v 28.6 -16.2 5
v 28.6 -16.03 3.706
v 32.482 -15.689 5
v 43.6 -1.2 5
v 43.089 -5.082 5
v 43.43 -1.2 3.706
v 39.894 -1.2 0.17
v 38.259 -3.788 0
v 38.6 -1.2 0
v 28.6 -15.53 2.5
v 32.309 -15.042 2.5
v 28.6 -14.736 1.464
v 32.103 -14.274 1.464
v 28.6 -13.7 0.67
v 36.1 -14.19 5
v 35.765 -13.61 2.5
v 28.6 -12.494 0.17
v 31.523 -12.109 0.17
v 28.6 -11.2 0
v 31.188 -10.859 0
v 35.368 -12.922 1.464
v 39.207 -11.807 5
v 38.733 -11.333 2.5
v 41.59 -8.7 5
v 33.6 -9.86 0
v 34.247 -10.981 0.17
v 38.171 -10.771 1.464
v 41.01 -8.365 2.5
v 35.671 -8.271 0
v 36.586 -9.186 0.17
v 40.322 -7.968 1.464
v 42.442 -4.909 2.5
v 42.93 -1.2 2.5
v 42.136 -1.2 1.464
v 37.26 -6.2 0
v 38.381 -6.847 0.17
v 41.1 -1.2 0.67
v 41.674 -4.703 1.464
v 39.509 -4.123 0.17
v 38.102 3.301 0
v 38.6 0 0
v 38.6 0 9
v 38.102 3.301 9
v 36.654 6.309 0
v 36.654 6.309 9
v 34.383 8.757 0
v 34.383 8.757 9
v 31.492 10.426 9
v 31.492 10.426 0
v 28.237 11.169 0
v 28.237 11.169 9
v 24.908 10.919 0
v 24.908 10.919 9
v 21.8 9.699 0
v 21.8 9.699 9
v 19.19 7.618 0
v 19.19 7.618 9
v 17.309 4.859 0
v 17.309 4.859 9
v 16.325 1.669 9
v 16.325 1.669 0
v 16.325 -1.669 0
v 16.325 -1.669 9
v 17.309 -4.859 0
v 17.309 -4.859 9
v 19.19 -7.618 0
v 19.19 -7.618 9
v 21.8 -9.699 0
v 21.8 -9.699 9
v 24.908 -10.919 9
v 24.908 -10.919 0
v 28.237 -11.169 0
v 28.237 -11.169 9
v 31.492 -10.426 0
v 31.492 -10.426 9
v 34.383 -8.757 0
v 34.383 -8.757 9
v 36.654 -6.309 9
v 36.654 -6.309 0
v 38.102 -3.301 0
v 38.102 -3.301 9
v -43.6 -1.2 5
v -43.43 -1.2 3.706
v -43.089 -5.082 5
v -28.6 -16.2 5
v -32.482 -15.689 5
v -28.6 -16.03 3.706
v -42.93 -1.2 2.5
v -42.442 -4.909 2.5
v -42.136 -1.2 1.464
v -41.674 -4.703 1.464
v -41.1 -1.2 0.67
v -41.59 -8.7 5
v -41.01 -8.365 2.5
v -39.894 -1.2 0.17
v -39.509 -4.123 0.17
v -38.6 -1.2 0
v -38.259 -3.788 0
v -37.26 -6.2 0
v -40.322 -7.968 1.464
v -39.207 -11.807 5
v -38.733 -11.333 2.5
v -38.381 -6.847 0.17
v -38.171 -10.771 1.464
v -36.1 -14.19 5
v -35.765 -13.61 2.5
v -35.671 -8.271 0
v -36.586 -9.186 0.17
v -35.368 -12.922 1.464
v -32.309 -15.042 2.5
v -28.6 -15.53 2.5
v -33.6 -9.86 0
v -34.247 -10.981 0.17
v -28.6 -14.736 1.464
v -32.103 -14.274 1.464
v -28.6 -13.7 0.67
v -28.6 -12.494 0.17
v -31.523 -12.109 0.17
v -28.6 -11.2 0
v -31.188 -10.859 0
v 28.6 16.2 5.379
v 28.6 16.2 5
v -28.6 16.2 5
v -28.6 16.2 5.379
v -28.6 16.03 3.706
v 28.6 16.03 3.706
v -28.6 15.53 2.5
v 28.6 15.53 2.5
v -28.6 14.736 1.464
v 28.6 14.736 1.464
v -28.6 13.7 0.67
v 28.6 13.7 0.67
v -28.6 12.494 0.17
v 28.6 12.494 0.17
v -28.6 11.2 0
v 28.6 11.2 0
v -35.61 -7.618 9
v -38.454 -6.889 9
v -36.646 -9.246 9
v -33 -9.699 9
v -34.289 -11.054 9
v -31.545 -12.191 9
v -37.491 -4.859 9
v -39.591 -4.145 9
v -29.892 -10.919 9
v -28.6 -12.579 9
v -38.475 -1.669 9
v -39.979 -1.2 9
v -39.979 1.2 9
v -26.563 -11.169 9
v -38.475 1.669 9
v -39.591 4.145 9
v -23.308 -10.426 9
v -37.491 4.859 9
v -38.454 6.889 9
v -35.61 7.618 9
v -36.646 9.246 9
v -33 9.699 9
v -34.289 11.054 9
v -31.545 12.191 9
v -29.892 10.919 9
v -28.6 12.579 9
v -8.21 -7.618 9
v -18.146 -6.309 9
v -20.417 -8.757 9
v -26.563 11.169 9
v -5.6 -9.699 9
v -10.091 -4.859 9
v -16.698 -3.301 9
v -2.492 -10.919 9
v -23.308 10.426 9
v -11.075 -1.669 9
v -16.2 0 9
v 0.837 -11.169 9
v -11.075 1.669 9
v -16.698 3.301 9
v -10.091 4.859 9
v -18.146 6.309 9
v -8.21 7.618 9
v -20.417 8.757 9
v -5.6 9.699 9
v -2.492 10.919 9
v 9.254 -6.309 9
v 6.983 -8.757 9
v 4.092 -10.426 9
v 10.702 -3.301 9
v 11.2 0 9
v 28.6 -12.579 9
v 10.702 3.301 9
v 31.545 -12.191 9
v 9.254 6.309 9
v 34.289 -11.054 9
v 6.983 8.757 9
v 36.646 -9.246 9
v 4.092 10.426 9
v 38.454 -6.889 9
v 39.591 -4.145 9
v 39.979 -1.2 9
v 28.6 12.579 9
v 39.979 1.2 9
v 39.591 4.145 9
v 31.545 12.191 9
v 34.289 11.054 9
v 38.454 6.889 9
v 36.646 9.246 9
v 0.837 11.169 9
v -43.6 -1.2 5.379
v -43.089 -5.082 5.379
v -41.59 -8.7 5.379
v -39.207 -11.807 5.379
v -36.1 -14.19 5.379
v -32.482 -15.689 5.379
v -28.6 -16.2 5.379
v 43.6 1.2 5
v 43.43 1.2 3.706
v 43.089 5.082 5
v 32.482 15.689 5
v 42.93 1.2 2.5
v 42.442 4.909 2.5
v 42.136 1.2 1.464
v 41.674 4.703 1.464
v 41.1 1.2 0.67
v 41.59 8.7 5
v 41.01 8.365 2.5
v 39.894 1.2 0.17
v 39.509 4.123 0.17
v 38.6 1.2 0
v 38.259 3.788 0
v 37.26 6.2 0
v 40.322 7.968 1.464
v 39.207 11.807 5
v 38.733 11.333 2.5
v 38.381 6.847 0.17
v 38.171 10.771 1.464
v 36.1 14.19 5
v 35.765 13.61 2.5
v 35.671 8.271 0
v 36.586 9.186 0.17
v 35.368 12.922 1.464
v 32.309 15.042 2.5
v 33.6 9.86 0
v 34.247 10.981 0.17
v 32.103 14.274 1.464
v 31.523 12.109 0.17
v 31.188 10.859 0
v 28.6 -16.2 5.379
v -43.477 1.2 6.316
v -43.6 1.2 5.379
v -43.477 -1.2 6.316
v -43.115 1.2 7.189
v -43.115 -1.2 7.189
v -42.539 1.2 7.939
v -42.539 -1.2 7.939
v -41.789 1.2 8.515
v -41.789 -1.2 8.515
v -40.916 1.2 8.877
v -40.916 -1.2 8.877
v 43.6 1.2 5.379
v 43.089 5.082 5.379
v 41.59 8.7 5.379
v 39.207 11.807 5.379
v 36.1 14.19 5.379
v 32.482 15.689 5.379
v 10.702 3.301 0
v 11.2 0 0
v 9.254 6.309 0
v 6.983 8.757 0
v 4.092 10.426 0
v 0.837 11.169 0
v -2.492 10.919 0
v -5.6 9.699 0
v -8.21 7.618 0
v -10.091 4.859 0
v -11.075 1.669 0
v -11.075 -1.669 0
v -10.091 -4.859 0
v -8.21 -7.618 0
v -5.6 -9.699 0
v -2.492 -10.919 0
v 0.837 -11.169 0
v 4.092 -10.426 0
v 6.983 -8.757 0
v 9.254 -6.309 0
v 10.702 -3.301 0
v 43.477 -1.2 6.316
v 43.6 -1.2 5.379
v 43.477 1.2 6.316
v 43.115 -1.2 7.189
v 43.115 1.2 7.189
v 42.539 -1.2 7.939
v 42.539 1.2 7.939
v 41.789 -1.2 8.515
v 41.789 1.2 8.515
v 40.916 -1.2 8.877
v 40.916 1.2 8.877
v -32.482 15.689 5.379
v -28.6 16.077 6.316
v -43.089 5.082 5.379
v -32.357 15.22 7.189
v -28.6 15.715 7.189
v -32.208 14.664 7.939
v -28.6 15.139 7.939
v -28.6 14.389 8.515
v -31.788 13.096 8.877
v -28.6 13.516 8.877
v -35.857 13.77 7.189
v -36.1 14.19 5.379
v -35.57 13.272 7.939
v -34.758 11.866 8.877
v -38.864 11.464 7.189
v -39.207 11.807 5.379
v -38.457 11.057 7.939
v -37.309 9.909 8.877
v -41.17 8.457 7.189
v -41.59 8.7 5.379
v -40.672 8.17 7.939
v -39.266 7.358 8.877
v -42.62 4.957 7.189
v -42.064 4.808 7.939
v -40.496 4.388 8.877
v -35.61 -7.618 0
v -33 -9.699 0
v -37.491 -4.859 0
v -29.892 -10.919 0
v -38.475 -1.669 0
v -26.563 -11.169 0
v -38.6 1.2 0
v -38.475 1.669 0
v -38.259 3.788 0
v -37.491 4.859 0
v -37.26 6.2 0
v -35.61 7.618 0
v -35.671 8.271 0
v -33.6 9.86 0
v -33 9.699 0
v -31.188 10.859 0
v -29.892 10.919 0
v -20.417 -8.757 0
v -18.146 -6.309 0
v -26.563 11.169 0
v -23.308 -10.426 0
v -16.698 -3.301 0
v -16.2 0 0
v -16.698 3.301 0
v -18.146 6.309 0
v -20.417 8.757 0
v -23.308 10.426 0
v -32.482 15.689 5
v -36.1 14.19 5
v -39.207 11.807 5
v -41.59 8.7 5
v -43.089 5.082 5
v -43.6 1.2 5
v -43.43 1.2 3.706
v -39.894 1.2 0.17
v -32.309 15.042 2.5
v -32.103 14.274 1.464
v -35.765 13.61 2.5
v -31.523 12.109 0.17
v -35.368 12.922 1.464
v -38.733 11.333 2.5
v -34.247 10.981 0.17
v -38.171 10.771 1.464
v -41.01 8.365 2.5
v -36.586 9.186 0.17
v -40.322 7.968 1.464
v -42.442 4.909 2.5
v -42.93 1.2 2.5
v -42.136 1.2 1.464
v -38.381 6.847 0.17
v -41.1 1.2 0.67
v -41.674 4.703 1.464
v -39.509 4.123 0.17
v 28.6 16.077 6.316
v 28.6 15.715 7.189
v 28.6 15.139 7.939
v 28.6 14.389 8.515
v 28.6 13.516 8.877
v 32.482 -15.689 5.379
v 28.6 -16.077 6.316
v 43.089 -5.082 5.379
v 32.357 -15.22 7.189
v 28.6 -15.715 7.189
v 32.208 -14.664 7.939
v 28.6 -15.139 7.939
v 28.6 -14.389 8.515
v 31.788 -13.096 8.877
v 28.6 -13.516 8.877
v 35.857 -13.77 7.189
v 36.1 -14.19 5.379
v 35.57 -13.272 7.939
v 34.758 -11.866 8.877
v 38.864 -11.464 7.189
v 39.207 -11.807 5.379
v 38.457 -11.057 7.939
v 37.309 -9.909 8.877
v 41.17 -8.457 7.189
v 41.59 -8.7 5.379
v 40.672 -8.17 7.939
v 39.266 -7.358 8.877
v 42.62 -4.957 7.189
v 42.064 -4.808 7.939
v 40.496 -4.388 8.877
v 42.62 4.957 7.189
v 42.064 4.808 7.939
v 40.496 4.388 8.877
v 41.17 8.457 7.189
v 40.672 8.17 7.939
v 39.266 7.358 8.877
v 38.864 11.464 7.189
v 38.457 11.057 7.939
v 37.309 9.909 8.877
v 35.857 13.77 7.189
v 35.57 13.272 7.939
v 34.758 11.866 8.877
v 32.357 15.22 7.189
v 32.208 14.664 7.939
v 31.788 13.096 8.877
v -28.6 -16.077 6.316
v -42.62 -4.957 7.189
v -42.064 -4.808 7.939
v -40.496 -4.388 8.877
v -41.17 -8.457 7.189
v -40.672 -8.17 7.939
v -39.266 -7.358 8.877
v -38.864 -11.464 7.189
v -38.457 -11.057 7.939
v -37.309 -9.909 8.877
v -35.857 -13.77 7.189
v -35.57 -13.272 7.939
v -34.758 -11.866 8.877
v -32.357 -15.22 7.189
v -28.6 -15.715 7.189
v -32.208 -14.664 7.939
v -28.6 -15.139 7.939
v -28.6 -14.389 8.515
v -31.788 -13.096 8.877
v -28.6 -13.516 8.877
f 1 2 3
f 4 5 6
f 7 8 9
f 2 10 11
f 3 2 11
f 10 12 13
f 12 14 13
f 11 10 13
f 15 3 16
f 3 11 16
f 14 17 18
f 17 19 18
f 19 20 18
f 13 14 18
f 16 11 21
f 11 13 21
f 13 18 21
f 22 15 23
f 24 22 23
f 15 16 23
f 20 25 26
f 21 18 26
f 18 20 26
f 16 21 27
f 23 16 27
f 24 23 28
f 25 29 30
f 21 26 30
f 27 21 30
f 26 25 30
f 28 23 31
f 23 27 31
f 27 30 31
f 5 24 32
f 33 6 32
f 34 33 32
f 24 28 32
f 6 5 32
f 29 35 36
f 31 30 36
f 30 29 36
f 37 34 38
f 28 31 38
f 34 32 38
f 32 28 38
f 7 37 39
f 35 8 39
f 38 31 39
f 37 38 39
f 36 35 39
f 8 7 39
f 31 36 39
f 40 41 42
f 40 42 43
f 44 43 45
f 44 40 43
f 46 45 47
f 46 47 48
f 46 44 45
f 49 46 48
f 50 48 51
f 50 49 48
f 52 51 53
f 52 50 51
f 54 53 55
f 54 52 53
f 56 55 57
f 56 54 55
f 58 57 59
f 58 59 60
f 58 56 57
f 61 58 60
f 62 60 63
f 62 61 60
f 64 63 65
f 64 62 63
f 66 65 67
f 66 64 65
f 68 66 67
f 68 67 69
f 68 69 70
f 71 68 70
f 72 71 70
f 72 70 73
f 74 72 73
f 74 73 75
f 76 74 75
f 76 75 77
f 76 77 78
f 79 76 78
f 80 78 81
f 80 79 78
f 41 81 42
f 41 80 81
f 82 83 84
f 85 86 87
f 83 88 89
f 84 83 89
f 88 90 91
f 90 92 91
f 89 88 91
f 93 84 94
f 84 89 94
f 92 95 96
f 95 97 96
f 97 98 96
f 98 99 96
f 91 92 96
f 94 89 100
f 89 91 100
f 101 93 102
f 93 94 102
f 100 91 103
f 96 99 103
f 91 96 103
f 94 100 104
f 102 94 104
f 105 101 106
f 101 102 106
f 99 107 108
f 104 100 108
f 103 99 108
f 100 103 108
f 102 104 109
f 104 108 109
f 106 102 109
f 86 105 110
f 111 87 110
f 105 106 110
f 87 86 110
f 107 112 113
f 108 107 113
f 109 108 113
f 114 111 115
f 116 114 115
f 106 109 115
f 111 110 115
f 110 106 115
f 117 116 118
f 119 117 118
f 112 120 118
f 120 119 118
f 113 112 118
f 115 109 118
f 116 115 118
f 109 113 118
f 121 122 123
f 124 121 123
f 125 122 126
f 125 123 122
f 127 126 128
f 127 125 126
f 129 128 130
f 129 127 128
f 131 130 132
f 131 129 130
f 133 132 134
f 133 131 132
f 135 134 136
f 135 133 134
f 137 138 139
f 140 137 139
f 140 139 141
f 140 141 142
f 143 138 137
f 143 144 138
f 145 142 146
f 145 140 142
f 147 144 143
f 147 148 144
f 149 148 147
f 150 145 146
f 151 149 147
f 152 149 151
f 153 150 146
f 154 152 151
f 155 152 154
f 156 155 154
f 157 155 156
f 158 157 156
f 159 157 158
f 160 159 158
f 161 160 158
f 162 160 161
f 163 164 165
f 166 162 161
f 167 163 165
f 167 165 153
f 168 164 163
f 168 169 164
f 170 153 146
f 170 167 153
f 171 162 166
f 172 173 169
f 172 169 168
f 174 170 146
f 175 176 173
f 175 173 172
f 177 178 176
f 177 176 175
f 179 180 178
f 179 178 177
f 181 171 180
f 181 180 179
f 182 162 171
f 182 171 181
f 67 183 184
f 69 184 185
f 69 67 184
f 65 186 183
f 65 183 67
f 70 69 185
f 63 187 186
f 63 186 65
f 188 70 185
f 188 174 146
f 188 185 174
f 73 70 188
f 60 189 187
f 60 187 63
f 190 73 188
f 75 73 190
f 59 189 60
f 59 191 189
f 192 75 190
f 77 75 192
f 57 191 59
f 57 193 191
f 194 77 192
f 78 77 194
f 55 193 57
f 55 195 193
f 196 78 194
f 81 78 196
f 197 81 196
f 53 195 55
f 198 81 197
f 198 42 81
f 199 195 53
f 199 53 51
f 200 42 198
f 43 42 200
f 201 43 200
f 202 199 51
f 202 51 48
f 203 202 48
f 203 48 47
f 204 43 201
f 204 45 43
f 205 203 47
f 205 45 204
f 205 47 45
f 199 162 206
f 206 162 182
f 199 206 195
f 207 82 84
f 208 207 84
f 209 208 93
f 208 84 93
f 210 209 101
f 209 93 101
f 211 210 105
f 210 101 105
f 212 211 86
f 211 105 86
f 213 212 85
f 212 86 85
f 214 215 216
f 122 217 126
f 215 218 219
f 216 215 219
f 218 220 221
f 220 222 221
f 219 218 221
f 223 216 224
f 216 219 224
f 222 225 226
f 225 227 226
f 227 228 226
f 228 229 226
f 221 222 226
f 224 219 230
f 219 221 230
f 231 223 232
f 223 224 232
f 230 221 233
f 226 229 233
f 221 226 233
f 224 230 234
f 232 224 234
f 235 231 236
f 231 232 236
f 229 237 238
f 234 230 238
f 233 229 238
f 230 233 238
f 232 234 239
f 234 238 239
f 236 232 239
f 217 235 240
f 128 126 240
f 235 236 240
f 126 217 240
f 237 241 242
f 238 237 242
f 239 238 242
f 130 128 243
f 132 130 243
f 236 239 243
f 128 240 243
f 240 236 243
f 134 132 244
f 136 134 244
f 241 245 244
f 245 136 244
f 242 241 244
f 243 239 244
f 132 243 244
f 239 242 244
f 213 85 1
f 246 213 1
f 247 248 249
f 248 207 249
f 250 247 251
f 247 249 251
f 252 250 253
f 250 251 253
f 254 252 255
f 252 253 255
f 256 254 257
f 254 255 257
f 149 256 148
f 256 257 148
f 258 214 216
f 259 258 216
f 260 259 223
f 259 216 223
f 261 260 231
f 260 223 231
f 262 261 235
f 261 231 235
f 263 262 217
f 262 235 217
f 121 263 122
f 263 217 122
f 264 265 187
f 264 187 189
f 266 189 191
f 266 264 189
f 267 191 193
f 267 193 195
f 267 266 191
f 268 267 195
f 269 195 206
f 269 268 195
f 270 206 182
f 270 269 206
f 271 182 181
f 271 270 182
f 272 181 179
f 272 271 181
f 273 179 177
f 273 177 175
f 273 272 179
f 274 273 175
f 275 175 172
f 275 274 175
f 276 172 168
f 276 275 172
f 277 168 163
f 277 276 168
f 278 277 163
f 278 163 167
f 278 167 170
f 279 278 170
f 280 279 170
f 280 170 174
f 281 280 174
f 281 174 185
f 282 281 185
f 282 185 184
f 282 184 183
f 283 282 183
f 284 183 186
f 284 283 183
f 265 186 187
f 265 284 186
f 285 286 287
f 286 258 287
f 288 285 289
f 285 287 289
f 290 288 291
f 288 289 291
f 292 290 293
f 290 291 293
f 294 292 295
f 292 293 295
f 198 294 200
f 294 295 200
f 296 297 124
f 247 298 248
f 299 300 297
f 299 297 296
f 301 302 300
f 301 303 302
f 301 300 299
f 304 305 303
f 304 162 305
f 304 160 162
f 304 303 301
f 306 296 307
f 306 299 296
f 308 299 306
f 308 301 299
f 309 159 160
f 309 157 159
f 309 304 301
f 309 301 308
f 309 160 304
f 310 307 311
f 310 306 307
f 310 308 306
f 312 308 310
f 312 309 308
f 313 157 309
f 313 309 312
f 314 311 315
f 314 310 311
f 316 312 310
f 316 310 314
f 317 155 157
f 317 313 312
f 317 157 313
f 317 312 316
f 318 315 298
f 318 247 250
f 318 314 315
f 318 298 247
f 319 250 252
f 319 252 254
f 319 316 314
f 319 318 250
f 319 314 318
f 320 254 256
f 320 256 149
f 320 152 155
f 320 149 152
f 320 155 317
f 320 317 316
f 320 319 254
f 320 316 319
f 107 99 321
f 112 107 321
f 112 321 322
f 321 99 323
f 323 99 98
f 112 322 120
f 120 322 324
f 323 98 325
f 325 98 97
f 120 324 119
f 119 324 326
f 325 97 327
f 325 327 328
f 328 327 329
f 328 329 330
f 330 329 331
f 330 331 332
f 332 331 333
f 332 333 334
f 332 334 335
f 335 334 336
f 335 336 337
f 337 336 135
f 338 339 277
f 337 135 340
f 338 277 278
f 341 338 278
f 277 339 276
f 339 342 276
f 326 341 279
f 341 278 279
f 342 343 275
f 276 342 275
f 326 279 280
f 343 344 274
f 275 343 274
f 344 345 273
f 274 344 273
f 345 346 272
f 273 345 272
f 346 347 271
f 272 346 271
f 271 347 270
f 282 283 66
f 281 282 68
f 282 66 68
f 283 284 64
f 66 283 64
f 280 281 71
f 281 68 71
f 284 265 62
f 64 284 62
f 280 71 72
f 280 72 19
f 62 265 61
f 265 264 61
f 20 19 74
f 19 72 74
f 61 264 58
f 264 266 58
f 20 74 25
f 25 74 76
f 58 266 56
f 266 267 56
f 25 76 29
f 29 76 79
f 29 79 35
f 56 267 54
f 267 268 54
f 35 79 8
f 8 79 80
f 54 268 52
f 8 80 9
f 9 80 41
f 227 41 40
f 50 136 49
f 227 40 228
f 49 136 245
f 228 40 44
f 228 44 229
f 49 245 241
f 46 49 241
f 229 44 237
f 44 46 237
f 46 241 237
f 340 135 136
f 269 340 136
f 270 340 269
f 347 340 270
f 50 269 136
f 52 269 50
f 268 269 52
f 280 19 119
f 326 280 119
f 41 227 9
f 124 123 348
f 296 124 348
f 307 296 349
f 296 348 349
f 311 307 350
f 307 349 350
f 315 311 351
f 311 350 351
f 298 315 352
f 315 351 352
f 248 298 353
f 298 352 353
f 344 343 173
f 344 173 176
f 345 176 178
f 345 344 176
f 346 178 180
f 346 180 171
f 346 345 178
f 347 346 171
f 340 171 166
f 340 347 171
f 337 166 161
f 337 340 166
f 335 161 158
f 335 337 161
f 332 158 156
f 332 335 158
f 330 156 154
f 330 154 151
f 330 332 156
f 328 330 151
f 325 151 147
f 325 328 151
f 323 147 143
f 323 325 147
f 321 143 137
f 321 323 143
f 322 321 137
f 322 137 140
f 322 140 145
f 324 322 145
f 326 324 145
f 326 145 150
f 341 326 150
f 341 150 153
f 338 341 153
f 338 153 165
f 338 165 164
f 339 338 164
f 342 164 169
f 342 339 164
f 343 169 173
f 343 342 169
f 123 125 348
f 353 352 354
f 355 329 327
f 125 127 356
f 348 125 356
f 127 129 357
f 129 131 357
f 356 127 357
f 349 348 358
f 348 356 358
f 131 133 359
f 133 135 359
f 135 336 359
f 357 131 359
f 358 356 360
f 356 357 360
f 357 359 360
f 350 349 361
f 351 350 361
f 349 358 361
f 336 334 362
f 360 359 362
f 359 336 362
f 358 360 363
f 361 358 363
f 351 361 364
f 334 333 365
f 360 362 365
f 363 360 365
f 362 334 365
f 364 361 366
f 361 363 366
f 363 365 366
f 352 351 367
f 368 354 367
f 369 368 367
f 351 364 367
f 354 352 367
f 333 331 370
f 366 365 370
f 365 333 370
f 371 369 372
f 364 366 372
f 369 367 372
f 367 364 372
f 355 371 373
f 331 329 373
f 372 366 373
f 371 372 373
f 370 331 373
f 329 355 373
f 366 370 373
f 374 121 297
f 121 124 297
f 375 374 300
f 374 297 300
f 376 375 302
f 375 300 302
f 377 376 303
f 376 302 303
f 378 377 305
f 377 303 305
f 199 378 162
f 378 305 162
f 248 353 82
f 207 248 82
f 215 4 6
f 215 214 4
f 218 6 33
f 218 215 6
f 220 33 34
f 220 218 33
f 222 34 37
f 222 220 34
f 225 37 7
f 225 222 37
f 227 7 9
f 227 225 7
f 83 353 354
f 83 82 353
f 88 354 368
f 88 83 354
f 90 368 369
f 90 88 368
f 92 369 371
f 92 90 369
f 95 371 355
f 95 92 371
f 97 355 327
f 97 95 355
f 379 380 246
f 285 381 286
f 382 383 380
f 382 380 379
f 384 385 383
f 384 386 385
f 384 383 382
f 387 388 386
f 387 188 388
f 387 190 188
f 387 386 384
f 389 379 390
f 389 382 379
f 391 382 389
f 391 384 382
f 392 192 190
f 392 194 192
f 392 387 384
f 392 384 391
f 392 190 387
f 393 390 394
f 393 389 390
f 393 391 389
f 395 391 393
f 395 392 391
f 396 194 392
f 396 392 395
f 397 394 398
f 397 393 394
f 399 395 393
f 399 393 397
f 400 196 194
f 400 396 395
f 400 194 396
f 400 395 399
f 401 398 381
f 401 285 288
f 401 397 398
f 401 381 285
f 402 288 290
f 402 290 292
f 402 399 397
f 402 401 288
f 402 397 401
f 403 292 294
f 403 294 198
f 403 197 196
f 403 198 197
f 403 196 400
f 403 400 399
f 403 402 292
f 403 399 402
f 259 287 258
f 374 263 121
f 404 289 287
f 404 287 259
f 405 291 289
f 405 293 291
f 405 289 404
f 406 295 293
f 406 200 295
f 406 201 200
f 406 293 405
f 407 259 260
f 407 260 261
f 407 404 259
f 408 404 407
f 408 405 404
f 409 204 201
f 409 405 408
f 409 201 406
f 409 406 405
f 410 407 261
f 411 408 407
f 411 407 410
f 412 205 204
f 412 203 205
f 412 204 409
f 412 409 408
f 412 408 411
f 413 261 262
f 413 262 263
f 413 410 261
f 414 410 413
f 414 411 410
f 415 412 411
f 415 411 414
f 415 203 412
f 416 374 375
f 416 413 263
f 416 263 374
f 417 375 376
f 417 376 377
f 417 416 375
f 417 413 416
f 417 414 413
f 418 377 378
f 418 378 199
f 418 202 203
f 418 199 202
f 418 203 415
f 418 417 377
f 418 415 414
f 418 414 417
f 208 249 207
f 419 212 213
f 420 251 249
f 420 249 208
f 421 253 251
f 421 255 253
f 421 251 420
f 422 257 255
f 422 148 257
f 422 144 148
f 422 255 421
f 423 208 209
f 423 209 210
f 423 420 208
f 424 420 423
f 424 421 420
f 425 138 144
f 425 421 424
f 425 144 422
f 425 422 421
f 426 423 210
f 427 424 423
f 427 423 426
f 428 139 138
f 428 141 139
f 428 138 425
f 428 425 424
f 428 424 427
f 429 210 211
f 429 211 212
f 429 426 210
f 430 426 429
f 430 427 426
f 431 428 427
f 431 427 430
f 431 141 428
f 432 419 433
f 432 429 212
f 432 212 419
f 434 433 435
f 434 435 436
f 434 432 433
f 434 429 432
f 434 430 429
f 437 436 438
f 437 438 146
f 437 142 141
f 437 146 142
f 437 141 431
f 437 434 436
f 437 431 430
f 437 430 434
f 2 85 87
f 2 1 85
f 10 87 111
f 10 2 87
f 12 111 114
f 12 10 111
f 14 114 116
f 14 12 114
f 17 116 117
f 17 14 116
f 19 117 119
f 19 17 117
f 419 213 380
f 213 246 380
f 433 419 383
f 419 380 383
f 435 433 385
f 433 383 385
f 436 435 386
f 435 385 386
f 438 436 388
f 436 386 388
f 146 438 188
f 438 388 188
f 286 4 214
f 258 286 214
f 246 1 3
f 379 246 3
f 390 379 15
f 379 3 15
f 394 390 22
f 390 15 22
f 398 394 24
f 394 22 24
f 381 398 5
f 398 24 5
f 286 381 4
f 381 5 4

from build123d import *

# Parameters (mm, degrees)
F0_R     = 11.2
F1_DEPTH = 9
F2_R     = 3.6213203436
F3_R     = 4.99999


# Not quite as in the source:
# - a fillet or chamfer is up to 0.001 mm smaller than in the source, because OpenCascade refuses the exact size


with BuildPart() as f1:
    # F0 (on Top) → F1 (new body)
    with BuildSketch(Plane.XY):
        with BuildLine():
            Line((28.6, 16.2), (-28.6, 16.2))
            ThreePointArc((-28.6, 16.2), (-39.2066017178, 11.8066017178), (-43.6, 1.2))
            Line((-43.6, 1.2), (-43.6, -1.2))
            ThreePointArc((-43.6, -1.2), (-39.2066017178, -11.8066017178), (-28.6, -16.2))
            Line((-28.6, -16.2), (28.6, -16.2))
            ThreePointArc((28.6, -16.2), (39.2066017178, -11.8066017178), (43.6, -1.2))
            Line((43.6, -1.2), (43.6, 1.2))
            ThreePointArc((43.6, 1.2), (39.2066017178, 11.8066017178), (28.6, 16.2))
        make_face()
        with Locations((-27.4, 0)):
            Circle(F0_R, mode=Mode.SUBTRACT)
        Circle(F0_R, mode=Mode.SUBTRACT)
        with Locations((27.4, 0)):
            Circle(F0_R, mode=Mode.SUBTRACT)
    extrude(amount=F1_DEPTH)

    # F2
    f2_edges = [f1.edges().sort_by_distance(p)[0] for p in [
        (39.206602, 11.806602, 9),
    ]]
    fillet(f2_edges, radius=F2_R)

    # F3 (radius 5 in the source; OpenCascade refuses exactly that, so slightly less here)
    f3_edges = [f1.edges().sort_by_distance(p)[0] for p in [
        (0, 16.2, 0),
        (39.206602, 11.806602, 0),
    ]]
    fillet(f3_edges, radius=F3_R)


solid = f1.part
